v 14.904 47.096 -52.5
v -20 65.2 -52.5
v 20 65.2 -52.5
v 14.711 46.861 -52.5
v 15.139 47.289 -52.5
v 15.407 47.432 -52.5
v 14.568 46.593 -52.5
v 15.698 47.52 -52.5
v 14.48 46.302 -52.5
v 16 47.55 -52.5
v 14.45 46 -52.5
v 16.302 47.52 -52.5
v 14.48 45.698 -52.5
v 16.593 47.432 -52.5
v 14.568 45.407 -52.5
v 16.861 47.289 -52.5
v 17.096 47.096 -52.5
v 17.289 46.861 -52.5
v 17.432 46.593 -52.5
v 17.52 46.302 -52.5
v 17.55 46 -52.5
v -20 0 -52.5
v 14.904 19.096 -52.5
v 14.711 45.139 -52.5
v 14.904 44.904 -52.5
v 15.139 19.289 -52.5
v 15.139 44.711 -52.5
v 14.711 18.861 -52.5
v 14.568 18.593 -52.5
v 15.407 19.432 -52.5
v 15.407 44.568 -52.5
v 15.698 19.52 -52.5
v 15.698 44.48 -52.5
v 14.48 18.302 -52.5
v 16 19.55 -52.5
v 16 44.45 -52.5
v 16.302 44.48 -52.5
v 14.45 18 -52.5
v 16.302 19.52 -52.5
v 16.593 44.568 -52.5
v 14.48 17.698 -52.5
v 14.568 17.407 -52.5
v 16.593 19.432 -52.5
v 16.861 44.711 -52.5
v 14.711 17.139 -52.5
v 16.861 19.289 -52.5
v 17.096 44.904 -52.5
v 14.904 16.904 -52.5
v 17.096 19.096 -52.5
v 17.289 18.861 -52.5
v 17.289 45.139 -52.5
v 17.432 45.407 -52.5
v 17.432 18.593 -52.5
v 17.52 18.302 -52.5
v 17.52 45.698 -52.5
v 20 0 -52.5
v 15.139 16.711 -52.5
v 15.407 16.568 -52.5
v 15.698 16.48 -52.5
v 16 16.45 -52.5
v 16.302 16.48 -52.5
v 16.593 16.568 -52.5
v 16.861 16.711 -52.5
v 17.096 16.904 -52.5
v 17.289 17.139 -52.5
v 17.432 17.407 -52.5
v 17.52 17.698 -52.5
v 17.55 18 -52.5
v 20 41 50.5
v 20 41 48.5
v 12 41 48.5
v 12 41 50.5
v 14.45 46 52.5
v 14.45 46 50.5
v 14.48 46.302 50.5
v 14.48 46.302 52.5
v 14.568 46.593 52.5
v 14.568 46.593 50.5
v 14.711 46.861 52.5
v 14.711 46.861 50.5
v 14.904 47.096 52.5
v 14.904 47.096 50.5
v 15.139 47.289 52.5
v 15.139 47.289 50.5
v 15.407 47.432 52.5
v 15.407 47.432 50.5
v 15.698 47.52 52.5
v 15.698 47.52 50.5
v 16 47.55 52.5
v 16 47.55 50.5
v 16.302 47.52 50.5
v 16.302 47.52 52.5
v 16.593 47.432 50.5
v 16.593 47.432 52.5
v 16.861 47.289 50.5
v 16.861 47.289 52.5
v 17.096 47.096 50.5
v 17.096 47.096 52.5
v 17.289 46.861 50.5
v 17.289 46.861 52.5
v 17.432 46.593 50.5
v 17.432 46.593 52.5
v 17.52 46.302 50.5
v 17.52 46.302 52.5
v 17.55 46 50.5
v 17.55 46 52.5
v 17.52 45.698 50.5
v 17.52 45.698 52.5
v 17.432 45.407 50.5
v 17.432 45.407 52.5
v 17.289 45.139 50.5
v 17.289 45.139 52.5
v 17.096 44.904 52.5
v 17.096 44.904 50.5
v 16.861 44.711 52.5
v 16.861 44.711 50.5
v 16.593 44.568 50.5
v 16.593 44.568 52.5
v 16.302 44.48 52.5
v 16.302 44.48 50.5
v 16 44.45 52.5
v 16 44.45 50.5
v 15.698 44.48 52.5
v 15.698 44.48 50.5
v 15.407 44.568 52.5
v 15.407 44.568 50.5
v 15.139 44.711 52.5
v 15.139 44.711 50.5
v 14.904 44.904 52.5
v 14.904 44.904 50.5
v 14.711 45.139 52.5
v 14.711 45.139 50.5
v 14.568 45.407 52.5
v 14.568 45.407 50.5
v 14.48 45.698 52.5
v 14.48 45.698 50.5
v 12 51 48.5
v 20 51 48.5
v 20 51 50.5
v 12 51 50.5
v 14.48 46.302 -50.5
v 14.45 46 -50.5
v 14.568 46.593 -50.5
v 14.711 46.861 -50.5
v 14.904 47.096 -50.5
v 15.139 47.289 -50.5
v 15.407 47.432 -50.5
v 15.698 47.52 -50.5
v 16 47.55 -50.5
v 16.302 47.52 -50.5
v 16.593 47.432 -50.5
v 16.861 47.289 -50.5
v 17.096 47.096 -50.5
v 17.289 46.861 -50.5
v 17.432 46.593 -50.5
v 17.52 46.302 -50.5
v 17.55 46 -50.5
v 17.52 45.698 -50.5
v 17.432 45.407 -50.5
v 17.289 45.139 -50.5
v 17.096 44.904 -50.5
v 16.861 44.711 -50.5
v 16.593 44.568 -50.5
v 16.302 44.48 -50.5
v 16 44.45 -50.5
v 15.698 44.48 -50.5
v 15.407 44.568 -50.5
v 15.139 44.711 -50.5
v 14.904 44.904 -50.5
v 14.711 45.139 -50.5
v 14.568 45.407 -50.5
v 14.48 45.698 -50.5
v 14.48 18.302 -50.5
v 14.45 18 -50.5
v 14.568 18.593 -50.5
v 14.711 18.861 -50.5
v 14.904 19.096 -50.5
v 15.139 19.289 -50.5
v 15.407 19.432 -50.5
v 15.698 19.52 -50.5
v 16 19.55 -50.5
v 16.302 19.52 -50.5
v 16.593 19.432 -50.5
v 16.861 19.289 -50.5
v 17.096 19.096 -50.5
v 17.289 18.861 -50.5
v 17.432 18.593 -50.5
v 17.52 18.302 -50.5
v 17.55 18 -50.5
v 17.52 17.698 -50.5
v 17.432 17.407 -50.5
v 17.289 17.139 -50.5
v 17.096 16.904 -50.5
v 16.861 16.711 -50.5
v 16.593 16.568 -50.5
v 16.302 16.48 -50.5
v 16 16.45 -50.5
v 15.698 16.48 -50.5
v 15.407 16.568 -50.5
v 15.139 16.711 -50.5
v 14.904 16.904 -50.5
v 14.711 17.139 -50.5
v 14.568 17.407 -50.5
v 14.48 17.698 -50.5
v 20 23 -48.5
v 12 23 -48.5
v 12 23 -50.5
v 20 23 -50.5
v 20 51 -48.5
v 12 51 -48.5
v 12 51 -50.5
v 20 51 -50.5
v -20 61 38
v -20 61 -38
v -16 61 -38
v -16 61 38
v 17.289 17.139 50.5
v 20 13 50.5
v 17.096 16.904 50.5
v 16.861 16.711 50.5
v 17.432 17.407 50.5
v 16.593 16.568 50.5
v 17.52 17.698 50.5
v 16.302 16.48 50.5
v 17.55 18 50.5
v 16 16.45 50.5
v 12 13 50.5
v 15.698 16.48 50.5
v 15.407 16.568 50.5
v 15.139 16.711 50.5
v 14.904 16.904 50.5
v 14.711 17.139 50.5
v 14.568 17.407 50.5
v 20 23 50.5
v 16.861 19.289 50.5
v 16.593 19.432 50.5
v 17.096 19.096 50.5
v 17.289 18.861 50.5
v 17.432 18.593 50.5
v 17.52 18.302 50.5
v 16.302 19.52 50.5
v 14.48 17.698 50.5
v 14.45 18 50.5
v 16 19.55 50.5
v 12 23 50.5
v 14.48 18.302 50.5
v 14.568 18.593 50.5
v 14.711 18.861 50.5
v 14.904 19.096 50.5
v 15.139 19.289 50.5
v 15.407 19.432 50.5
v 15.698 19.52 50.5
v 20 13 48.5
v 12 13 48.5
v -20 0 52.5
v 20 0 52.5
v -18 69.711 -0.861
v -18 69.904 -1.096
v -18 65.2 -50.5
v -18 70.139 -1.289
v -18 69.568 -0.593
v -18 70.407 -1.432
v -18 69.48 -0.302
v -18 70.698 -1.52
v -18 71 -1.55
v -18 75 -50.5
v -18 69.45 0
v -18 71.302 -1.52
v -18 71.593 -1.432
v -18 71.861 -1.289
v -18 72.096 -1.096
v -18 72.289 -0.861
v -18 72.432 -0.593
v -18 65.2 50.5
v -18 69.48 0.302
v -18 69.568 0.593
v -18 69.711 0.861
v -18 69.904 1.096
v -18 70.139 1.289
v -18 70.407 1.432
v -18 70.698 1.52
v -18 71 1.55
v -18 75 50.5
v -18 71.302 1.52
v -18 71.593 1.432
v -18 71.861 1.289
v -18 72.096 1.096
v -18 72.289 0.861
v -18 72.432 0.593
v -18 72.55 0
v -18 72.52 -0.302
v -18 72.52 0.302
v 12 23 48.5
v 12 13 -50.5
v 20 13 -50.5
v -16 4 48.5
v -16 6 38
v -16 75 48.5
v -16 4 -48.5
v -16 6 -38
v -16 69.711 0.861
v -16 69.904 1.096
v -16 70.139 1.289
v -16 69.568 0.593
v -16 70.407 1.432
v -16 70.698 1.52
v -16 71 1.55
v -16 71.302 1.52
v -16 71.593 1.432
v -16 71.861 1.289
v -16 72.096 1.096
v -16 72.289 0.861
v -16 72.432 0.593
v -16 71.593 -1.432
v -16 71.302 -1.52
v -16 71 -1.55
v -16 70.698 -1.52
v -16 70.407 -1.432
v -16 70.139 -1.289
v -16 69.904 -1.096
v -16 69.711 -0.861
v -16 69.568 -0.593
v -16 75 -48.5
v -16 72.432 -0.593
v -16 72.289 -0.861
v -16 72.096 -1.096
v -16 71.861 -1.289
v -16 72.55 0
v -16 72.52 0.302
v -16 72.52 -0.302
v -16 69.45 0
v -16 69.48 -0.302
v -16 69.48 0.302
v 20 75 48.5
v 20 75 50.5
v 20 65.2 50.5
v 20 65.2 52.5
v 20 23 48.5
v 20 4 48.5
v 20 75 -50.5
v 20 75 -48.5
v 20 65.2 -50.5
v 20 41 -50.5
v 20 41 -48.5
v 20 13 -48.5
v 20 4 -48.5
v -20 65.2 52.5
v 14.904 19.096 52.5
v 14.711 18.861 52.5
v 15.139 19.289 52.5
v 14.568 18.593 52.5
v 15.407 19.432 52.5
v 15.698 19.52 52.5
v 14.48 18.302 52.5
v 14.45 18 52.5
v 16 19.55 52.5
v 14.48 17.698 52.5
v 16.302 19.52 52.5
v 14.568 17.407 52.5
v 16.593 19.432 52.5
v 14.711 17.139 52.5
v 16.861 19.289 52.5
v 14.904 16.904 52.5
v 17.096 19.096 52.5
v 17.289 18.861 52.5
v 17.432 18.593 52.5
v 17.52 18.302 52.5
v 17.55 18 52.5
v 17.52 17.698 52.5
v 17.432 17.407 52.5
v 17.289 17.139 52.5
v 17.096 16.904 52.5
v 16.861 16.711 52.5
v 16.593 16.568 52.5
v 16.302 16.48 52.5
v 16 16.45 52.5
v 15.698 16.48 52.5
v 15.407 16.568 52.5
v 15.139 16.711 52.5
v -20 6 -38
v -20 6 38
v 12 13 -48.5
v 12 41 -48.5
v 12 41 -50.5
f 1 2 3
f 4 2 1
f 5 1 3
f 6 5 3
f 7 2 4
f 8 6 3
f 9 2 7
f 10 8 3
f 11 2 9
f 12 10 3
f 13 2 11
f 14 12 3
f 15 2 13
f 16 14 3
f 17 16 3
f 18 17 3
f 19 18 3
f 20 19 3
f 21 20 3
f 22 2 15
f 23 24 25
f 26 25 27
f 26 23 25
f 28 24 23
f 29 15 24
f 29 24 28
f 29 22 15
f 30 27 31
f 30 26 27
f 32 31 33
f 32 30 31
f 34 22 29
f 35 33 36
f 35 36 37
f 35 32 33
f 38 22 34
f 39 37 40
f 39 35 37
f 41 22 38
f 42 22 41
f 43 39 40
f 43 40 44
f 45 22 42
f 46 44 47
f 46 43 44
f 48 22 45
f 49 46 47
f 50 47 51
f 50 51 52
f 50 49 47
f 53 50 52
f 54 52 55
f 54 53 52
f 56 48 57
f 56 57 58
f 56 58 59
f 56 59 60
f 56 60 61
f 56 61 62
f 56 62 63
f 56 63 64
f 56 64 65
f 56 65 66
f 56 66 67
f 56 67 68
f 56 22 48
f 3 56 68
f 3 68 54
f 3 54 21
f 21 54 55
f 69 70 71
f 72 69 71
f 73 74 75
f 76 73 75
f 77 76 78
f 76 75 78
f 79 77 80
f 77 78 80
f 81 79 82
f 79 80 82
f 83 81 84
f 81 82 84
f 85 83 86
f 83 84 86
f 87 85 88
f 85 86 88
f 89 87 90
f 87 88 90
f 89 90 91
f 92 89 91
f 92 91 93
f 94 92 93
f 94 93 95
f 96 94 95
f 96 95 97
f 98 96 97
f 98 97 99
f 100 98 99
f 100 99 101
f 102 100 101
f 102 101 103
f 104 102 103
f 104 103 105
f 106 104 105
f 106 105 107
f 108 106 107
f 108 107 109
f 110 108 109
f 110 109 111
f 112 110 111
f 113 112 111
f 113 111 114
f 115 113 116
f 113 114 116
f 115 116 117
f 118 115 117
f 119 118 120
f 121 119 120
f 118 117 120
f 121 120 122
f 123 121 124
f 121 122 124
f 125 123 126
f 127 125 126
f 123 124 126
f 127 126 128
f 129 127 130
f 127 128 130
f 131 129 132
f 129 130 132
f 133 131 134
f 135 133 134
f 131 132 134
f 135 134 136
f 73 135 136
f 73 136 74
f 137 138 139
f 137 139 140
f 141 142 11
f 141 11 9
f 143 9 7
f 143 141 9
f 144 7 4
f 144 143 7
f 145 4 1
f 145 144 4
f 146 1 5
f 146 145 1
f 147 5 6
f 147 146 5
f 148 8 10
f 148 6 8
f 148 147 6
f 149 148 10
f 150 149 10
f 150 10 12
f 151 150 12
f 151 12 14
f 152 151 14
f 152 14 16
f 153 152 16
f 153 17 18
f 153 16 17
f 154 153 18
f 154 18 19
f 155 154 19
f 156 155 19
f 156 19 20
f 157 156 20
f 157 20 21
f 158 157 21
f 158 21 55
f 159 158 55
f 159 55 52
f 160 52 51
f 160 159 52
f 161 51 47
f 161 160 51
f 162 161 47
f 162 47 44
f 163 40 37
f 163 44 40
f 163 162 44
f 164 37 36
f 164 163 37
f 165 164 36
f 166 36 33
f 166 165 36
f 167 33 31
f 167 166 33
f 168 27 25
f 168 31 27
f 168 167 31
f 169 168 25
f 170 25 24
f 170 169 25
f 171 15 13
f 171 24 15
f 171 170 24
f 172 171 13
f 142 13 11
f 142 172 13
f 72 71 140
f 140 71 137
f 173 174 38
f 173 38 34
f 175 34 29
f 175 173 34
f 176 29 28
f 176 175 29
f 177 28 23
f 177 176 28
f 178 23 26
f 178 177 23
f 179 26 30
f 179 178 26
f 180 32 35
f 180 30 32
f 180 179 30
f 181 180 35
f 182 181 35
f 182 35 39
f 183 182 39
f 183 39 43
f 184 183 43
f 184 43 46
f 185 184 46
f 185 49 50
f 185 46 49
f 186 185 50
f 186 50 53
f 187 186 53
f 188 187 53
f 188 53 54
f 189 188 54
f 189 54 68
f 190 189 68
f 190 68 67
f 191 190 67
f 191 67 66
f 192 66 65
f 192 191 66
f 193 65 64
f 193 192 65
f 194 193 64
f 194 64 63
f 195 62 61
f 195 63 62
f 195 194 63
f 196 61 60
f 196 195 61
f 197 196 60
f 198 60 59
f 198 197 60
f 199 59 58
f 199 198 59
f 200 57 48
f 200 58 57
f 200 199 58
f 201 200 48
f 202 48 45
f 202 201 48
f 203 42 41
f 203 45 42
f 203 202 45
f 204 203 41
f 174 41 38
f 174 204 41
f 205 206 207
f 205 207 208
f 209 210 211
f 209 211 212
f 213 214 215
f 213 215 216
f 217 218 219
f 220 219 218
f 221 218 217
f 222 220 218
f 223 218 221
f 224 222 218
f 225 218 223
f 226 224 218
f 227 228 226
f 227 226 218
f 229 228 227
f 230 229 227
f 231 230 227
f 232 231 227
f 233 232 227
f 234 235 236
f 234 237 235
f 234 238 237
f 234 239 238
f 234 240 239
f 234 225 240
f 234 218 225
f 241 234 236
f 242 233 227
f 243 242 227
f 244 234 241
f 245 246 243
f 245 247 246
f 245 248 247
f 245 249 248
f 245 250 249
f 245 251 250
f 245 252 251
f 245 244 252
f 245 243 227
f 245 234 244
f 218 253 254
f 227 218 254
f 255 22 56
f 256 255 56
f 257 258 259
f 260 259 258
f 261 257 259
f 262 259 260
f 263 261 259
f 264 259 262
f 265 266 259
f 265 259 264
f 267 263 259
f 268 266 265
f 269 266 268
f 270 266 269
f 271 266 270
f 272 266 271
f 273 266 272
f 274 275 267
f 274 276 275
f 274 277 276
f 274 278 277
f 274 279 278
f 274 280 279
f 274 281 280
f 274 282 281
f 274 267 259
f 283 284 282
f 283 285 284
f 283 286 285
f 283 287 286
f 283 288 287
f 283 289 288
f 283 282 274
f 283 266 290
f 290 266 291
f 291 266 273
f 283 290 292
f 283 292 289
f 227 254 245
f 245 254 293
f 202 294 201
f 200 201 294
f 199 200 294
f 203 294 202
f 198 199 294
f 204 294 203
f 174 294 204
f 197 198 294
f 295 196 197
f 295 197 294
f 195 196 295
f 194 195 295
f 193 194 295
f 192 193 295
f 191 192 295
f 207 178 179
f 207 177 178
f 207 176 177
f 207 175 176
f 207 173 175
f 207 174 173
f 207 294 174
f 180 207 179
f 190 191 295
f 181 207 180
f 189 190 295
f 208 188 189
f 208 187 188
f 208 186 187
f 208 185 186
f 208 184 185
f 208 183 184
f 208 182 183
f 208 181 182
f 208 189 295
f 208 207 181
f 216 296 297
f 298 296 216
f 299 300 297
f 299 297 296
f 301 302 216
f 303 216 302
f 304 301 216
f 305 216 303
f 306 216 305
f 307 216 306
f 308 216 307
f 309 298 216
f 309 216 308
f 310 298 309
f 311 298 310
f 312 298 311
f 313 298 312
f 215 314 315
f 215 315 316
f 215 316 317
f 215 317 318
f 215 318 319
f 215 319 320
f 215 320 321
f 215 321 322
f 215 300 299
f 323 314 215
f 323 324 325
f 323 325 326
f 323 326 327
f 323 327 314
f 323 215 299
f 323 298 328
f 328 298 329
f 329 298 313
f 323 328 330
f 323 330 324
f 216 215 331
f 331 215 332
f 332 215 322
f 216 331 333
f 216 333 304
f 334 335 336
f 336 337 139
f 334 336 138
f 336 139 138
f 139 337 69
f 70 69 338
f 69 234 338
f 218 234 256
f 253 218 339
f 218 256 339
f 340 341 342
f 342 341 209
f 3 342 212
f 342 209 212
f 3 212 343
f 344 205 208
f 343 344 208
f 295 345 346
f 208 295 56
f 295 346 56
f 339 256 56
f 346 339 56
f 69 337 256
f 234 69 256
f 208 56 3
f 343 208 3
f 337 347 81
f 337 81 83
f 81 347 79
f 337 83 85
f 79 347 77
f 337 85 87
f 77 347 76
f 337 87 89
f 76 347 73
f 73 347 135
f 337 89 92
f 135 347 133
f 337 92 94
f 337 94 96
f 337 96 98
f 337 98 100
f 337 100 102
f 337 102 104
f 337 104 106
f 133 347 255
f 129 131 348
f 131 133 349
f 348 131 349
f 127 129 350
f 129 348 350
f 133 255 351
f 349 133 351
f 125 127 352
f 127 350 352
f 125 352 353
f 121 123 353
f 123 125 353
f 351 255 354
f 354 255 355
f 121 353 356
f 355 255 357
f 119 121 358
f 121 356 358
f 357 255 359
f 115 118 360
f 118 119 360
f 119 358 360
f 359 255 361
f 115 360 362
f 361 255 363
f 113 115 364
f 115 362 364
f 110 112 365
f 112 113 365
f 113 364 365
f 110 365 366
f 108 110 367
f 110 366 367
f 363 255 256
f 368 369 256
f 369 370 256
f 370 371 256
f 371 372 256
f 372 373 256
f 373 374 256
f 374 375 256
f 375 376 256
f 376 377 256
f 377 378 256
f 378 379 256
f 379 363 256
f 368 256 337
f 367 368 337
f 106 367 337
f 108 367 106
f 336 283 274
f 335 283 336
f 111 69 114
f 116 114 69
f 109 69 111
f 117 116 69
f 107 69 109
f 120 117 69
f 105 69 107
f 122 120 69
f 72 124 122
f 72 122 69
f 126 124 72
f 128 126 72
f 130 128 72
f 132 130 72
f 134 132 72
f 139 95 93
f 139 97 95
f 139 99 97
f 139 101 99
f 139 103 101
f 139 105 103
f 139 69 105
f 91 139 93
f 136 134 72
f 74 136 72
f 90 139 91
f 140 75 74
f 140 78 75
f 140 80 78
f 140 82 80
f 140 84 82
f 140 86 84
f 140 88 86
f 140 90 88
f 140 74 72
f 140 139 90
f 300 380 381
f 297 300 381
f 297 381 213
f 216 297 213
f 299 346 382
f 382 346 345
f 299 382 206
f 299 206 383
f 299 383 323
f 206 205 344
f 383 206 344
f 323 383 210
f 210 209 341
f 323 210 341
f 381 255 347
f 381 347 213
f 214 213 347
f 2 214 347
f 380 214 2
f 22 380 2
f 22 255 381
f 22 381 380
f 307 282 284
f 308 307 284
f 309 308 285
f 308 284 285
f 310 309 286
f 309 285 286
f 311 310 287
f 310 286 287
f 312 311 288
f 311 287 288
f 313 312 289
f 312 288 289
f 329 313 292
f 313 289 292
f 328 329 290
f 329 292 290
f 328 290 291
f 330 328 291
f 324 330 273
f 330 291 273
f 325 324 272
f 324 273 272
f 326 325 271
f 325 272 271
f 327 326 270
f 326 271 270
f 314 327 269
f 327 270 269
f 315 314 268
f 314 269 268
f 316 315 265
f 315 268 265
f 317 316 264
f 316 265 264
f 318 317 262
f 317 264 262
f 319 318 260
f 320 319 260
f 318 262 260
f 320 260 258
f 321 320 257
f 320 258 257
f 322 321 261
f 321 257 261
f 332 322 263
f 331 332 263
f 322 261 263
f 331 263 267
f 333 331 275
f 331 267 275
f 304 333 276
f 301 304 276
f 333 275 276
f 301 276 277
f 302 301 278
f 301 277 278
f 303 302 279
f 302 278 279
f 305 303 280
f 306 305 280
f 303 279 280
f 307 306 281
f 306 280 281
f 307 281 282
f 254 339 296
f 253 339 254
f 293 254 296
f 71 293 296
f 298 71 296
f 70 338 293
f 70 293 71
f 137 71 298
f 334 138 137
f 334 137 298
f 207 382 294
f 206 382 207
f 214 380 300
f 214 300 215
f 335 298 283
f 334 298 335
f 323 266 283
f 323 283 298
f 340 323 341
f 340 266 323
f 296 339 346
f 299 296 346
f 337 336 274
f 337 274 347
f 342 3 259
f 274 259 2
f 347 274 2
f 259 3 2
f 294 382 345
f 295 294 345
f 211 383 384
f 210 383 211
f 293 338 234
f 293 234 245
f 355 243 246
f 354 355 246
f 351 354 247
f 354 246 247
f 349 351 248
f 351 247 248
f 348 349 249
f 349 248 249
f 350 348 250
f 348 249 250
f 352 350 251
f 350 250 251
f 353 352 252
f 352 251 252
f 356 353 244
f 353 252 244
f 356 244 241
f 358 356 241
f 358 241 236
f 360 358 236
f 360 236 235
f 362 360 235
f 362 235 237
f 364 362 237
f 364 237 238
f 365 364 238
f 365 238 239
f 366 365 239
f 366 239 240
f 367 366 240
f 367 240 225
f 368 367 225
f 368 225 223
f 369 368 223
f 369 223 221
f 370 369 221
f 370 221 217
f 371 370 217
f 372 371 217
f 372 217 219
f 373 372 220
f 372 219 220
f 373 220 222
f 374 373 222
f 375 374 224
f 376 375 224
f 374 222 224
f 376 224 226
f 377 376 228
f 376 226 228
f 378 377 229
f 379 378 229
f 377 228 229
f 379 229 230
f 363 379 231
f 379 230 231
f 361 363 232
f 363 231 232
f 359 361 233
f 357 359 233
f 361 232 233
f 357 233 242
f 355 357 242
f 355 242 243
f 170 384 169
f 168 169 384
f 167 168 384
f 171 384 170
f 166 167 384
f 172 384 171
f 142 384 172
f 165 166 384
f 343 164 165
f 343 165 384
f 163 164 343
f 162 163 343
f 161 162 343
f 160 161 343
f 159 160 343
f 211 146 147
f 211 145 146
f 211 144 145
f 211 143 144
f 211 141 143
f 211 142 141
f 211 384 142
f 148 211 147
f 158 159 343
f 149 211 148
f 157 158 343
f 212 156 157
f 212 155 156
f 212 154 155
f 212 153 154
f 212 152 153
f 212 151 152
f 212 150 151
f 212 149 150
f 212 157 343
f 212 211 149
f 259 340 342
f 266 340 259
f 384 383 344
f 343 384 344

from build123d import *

# Parameters (mm, degrees)
SKETCH1_W               = 40
SKETCH1_H               = 105
BOSS_EXTRUDE3_DEPTH     = 75
SKETCH4_W               = 97
SKETCH4_H               = 71
CUT_EXTRUDE2_DEPTH      = 36
SKETCH5_W               = 40
SKETCH5_H               = 9.8
CUT_EXTRUDE3_DEPTH      = 2
SKETCH6_W               = 40
SKETCH6_H               = 9.8
CUT_EXTRUDE4_DEPTH      = 2
SKETCH7_W               = 101
SKETCH7_H               = 9.8
CUT_EXTRUDE5_DEPTH      = 2
SKETCH8_R               = 1.55
CUT_EXTRUDE6_DEPTH      = 102
CUT_EXTRUDE6_DEPTH_BACK = 5
SKETCH9_W               = 8
SKETCH9_H               = 10
CUT_EXTRUDE7_DEPTH      = 2
SKETCH10_R              = 1.55
CUT_EXTRUDE8_DEPTH      = 2
SKETCH11_W              = 8
SKETCH11_H              = 10
CUT_EXTRUDE9_DEPTH      = 2
CUT_EXTRUDE10_REACH     = 42
SKETCH12_W              = 76
SKETCH12_H              = 55


with BuildPart() as part:
    # Sketch1 → Boss-Extrude3 (new body)
    with BuildSketch(Plane(origin=(0, 0, 0), x_dir=(1, 0, 0), z_dir=(0, 1, 0))):
        Rectangle(SKETCH1_W, SKETCH1_H)
    extrude(amount=BOSS_EXTRUDE3_DEPTH)

    # Sketch4 → Cut-Extrude2 (cut)
    with BuildSketch(Plane(origin=(20, 0, 0), x_dir=(0, 0, -1), z_dir=(1, 0, 0))):
        with Locations((0, 39.5)):
            Rectangle(SKETCH4_W, SKETCH4_H)
    extrude(amount=-CUT_EXTRUDE2_DEPTH, mode=Mode.SUBTRACT)

    # Sketch5 → Cut-Extrude3 (cut)
    with BuildSketch(Plane.XY.offset(52.5)):
        with Locations((0, 70.1)):
            Rectangle(SKETCH5_W, SKETCH5_H)
    extrude(amount=-CUT_EXTRUDE3_DEPTH, mode=Mode.SUBTRACT)

    # Sketch6 → Cut-Extrude4 (cut)
    with BuildSketch(Plane(origin=(0, 0, -52.5), x_dir=(-1, 0, 0), z_dir=(0, 0, -1))):
        with Locations((0, 70.1)):
            Rectangle(SKETCH6_W, SKETCH6_H)
    extrude(amount=-CUT_EXTRUDE4_DEPTH, mode=Mode.SUBTRACT)

    # Sketch7 → Cut-Extrude5 (cut)
    with BuildSketch(Plane.ZY.offset(20)):
        with Locations((0, 70.1)):
            Rectangle(SKETCH7_W, SKETCH7_H)
    extrude(amount=-CUT_EXTRUDE5_DEPTH, mode=Mode.SUBTRACT)

    # Sketch8 → Cut-Extrude6 (cut, two sides)
    with BuildSketch(Plane(origin=(0, 0, 48.5), x_dir=(-1, 0, 0), z_dir=(0, 0, -1))) as cut_extrude6_sk:
        with Locations((-16, 18)):
            Circle(SKETCH8_R)
        with Locations((-16, 46)):
            Circle(SKETCH8_R)
    extrude(amount=CUT_EXTRUDE6_DEPTH, mode=Mode.SUBTRACT)
    extrude(cut_extrude6_sk.sketch, amount=-CUT_EXTRUDE6_DEPTH_BACK, mode=Mode.SUBTRACT)

    # Sketch9 → Cut-Extrude7 (cut)
    with BuildSketch(Plane(origin=(0, 0, 48.5), x_dir=(-1, 0, 0), z_dir=(0, 0, -1))):
        with Locations((-16, 18)):
            Rectangle(SKETCH9_W, SKETCH9_H)
        with Locations((-16, 46)):
            Rectangle(SKETCH9_W, SKETCH9_H)
    extrude(amount=-CUT_EXTRUDE7_DEPTH, mode=Mode.SUBTRACT)

    # Sketch10 → Cut-Extrude8 (cut)
    with BuildSketch(Plane.ZY.offset(18)):
        with Locations((0, 71)):
            Circle(SKETCH10_R)
    extrude(amount=-CUT_EXTRUDE8_DEPTH, mode=Mode.SUBTRACT)

    # Sketch11 → Cut-Extrude9 (cut)
    with BuildSketch(Plane.XY.offset(-48.5)):
        with Locations((16, 46)):
            Rectangle(SKETCH11_W, SKETCH11_H)
        with Locations((16, 18)):
            Rectangle(SKETCH11_W, SKETCH11_H)
    extrude(amount=-CUT_EXTRUDE9_DEPTH, mode=Mode.SUBTRACT)

    # Sketch12 → Cut-Extrude10 (cut, up to next)
    with BuildSketch(Plane.ZY.offset(20), mode=Mode.PRIVATE) as cut_extrude10_sk1:
        with Locations((0, 33.5)):
            Rectangle(SKETCH12_W, SKETCH12_H)
    cut_extrude10_tool1 = extrude(cut_extrude10_sk1.sketch, amount=-CUT_EXTRUDE10_REACH, mode=Mode.PRIVATE) & part.part
    add(cut_extrude10_tool1.solids().sort_by_distance((-20, 33.5, 0))[0], mode=Mode.SUBTRACT)


solid = part.part
